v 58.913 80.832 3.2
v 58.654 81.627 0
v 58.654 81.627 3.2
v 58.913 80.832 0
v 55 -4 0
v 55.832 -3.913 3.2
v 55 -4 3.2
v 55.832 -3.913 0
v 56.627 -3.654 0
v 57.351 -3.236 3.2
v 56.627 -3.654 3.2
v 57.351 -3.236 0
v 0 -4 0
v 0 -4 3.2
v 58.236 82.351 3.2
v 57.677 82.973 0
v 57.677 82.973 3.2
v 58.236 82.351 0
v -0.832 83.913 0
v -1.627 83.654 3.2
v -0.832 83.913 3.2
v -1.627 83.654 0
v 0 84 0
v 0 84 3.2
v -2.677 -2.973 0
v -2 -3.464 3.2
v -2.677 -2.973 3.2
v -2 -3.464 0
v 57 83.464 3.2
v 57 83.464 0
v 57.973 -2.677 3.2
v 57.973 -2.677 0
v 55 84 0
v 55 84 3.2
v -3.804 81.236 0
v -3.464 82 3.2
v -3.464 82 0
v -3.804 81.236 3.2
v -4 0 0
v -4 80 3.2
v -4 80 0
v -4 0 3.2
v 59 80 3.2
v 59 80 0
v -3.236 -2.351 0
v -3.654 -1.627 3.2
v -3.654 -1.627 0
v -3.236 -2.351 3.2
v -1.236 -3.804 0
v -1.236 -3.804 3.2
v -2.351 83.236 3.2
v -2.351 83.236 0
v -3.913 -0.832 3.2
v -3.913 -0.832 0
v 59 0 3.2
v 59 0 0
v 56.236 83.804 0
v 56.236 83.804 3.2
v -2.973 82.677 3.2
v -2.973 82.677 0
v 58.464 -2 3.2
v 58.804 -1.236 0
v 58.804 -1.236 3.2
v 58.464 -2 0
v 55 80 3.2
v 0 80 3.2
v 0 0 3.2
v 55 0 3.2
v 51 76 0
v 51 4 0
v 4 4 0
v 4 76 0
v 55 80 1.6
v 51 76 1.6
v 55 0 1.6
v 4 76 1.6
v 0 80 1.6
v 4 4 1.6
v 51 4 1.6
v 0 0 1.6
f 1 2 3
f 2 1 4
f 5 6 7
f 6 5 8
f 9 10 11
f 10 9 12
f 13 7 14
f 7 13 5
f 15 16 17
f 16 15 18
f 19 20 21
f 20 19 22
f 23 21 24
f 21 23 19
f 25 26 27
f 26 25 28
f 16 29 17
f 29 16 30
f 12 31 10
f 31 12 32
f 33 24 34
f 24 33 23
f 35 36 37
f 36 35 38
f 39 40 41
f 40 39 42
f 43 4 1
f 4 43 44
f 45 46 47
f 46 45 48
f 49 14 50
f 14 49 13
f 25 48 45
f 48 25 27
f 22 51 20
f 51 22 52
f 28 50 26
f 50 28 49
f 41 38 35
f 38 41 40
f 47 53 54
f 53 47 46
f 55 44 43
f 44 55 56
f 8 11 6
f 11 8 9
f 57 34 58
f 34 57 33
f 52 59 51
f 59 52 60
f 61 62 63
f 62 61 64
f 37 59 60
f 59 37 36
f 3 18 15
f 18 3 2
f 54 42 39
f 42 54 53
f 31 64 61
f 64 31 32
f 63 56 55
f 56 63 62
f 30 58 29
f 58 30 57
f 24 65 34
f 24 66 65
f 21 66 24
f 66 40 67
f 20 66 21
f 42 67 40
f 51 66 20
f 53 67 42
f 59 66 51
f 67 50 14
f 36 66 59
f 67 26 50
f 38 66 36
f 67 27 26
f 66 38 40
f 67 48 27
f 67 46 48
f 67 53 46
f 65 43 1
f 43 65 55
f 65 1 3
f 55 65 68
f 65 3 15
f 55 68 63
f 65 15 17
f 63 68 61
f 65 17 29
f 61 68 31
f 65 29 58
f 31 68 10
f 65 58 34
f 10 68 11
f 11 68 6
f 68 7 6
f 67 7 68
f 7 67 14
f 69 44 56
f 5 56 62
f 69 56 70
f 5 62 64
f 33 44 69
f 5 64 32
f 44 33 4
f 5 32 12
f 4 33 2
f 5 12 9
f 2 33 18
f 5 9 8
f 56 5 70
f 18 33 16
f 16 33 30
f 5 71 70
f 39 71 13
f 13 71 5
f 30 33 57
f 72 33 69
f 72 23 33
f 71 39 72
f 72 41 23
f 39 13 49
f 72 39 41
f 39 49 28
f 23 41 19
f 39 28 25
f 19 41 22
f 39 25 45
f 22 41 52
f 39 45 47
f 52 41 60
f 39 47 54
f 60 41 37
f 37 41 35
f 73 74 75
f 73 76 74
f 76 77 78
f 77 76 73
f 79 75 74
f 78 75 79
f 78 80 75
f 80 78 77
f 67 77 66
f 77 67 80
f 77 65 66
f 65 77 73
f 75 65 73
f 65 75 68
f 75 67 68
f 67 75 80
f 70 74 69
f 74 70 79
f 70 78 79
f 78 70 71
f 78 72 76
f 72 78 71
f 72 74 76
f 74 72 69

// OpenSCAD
$fn=30;
wBox=55;
lBox=80;
3dBD=0.4; //diametre de la buse de l'imprimante 3D
lIntB=10*3dBD; //largeur bord interieur
lExtB=10*3dBD; //largeur bord exterieur
hContour=0;
module pleine() {
color("blue")difference(){
color("orange") linear_extrude(3.2) offset(r=lExtB)  square([wBox,lBox],center=false);
translate([0,0,1.6]) color("red") linear_extrude(3.2) square([wBox,lBox],center=false);
}
}
difference(){
  pleine();  
  color("pink")translate([0,0,-4]) linear_extrude(8) offset(r=-lIntB) square([wBox,lBox], center=false);
}
